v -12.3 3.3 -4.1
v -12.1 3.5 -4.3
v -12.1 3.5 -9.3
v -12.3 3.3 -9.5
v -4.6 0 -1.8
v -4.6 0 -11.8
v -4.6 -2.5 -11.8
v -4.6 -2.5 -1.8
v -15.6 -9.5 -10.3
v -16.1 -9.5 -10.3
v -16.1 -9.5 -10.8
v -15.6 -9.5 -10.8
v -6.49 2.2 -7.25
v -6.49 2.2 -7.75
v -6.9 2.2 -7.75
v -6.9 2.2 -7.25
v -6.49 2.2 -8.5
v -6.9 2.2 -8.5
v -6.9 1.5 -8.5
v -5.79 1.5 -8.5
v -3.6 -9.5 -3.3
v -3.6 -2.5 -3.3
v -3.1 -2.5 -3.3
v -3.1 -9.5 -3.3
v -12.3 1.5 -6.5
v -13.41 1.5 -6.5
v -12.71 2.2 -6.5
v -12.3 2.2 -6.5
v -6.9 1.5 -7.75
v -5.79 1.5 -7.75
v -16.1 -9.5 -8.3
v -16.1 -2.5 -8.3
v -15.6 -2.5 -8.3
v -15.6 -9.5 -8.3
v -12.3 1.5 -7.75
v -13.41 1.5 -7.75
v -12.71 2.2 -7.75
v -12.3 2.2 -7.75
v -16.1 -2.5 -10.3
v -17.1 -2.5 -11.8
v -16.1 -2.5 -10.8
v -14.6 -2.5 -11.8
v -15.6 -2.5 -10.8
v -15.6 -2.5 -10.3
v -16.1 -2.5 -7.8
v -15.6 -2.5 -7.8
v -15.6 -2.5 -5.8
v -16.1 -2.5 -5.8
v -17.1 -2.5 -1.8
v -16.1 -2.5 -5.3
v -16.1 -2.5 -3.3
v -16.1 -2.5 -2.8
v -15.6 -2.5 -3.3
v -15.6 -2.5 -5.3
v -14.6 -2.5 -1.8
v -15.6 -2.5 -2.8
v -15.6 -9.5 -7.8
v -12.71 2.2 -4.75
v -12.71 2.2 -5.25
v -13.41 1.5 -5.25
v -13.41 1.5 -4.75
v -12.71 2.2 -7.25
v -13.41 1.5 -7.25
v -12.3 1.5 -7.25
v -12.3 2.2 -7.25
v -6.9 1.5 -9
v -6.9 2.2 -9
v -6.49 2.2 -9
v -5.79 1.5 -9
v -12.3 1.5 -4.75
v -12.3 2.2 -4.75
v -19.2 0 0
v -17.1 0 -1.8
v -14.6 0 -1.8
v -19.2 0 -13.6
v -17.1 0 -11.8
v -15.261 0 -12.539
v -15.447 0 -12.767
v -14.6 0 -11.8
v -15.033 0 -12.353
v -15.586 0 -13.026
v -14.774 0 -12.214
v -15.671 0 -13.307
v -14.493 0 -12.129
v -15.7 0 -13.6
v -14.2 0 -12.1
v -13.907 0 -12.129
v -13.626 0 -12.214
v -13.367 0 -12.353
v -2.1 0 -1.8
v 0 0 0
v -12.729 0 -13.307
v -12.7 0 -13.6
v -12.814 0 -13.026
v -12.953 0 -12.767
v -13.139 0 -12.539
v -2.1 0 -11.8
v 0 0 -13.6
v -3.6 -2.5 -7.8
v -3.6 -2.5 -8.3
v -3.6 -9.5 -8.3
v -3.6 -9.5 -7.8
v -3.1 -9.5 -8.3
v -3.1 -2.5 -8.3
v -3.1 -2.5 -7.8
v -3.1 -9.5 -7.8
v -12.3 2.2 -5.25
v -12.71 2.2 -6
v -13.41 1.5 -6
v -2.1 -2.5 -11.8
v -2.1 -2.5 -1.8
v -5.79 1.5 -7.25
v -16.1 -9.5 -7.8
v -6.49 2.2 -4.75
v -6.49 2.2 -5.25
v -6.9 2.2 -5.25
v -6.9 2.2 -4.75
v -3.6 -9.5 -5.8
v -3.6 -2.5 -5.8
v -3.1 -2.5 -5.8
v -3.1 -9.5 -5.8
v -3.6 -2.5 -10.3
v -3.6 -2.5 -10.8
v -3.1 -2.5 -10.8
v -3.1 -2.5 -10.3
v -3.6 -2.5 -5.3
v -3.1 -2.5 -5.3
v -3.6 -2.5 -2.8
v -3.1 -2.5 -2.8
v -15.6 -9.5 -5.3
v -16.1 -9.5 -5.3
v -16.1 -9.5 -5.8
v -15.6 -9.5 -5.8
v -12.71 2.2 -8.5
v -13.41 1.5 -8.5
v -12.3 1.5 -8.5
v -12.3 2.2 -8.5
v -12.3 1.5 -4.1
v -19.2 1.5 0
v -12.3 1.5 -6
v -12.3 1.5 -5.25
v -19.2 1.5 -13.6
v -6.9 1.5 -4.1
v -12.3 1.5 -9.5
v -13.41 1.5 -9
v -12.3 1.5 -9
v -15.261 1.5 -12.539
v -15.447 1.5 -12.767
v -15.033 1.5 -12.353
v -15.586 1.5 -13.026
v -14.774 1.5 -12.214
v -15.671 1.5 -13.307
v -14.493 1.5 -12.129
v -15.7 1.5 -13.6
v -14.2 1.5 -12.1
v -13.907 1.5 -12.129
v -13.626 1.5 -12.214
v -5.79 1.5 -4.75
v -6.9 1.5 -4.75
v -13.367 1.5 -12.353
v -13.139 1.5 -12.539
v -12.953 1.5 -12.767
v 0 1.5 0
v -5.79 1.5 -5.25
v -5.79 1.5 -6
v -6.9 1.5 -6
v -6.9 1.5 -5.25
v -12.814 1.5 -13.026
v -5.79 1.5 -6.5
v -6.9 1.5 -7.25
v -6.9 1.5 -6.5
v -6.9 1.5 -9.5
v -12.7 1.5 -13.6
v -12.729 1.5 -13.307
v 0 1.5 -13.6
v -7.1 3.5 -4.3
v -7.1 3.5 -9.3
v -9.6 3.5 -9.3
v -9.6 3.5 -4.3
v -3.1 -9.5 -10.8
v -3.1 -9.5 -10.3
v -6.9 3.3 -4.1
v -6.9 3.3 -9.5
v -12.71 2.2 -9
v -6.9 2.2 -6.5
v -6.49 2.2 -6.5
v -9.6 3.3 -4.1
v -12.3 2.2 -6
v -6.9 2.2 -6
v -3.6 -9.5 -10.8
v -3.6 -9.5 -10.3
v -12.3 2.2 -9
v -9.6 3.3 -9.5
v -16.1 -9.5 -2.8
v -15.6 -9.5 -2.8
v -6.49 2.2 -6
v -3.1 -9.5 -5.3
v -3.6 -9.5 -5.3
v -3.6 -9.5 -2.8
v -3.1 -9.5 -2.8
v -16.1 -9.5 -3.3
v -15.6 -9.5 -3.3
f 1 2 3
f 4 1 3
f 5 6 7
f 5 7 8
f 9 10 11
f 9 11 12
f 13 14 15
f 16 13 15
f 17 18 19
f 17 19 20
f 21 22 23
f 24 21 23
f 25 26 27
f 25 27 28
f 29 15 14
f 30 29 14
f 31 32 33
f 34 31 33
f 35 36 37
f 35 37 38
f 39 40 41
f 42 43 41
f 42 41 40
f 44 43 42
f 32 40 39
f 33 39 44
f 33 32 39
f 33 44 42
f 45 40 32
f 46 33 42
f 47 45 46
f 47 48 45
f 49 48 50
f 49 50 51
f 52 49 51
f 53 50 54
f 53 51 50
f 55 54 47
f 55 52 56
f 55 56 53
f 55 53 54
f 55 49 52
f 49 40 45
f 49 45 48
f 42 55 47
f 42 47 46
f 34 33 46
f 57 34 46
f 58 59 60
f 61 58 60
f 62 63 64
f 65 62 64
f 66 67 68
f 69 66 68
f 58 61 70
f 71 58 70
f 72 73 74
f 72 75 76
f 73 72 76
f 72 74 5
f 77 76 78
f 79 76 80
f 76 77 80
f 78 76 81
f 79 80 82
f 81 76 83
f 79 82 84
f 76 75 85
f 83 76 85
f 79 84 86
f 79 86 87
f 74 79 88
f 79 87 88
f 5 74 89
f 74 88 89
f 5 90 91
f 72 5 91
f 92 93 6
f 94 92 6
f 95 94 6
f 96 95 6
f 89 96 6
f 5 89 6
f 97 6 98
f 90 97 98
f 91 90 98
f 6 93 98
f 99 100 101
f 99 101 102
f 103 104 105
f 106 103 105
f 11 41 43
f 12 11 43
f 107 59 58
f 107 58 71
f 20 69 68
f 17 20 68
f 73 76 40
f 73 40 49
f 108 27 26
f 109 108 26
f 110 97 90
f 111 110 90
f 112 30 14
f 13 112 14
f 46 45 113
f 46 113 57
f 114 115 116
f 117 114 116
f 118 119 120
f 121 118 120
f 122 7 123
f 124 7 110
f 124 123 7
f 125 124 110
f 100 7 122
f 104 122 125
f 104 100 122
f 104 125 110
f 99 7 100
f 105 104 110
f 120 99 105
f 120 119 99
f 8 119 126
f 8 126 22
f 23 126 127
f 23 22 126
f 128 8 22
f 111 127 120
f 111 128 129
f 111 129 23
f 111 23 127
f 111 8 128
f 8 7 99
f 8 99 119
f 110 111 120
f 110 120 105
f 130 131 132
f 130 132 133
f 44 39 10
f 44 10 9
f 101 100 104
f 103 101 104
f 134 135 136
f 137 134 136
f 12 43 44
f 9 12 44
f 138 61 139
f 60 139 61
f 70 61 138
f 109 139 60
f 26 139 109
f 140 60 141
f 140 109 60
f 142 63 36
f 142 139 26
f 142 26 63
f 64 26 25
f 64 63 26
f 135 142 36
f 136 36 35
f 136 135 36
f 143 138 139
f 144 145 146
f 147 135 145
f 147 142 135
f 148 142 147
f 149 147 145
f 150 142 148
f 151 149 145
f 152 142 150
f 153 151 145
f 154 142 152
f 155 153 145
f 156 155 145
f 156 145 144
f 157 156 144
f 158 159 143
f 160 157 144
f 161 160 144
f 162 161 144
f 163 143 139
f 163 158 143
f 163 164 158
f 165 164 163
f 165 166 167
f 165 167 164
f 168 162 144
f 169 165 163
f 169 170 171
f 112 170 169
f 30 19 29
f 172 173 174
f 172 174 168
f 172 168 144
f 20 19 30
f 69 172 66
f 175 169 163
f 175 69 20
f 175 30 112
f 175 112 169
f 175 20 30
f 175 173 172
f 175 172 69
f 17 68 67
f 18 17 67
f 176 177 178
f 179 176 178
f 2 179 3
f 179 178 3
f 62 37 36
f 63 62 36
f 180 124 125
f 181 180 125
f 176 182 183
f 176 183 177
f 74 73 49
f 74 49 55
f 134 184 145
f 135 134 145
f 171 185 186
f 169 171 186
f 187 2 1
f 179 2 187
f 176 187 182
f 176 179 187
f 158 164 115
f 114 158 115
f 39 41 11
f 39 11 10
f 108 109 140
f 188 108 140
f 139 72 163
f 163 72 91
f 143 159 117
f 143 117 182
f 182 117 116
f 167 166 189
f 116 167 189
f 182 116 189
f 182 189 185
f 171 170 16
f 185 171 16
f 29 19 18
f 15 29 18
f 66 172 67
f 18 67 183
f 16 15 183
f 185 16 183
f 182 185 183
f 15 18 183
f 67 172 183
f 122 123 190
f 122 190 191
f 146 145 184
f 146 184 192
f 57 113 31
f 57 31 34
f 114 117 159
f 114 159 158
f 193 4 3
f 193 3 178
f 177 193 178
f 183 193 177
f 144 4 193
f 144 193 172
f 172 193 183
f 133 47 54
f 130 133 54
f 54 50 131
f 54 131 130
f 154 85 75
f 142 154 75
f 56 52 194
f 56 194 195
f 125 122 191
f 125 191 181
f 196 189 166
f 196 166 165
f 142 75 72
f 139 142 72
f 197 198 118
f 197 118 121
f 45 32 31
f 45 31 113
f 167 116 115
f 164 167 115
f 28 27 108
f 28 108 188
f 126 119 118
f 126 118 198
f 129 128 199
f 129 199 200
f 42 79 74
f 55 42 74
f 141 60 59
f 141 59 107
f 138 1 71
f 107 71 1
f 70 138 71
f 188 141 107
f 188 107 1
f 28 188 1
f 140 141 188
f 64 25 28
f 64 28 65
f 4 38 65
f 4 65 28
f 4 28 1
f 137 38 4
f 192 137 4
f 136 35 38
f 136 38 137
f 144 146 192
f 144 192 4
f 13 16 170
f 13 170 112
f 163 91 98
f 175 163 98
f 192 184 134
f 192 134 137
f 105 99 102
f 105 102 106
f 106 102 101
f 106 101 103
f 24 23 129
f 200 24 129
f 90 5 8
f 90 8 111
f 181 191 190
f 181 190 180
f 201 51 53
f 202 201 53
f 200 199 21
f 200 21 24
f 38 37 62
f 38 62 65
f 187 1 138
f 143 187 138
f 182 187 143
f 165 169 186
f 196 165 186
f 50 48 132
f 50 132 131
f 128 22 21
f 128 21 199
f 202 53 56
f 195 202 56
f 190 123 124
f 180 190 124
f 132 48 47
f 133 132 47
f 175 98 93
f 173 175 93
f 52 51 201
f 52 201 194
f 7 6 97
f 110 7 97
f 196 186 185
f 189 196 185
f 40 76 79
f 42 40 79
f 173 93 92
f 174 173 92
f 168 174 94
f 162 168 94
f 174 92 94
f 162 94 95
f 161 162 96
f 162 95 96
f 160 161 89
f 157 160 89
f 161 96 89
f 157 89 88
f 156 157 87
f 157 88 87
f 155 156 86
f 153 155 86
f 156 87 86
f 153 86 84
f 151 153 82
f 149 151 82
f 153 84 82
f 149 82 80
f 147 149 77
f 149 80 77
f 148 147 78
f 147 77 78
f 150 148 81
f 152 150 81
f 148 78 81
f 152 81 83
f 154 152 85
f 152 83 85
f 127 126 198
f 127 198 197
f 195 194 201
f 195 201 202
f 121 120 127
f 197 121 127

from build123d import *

# Parameters (mm, degrees)
BOSS_EXTRUDE1_DEPTH        = 1.5
SKETCH2_W                  = 2.7
SKETCH2_H                  = 5.4
BOSS_EXTRUDE2_DEPTH        = 2
CHAMFER1_SIZE              = 0.2
SKETCH3_W                  = 1.410498469
SKETCH3_H                  = 0.5
BOSS_EXTRUDE3_DEPTH        = 0.7
CHAMFER2_SIZE              = 1
LPATTERN2_COUNT            = 4
LPATTERN2_PITCH            = 1.25
CHAMFER2_OF_LPATTERN2_SIZE = 1
MIRROR1_START              = -9.5
MIRROR1_DEPTH              = 5.4
MIRROR1_START_2            = -9
MIRROR1_2_DEPTH            = 0.5
MIRROR1_START_3            = -7.75
MIRROR1_3_DEPTH            = 0.5
MIRROR1_START_4            = -6.5
MIRROR1_4_DEPTH            = 0.5
MIRROR1_START_5            = -5.25
MIRROR1_5_DEPTH            = 0.5
MIRROR1_START_6            = -0.565685425
MIRROR1_6_OUTLINE_W        = 4.6
MIRROR1_6_OUTLINE_H        = 5.050966799
MIRROR1_6_DEPTH            = 1.565685425
MIRROR1_START_7            = -5
MIRROR1_7_OUTLINE_W        = 4.6
MIRROR1_7_OUTLINE_H        = 1.949033201
MIRROR1_7_DEPTH            = 4.434314575
SKETCH5_W                  = 2.5
SKETCH5_H                  = 10
BOSS_EXTRUDE4_DEPTH        = 2.5
SKETCH6_W                  = 0.5
SKETCH6_H                  = 0.5
BOSS_EXTRUDE5_DEPTH        = 7
LPATTERN3_COUNT            = 4
LPATTERN3_PITCH            = 2.5


with BuildPart() as part:
    # Sketch1 → Boss-Extrude1 (new body)
    with BuildSketch(Plane(origin=(0, 0, 0), x_dir=(1, 0, 0), z_dir=(0, 1, 0))):
        with BuildLine():
            Line((-19.2, 0), (0, 0))
            Line((0, 0), (0, 13.6))
            Line((0, 13.6), (-12.7, 13.6))
            ThreePointArc((-12.7, 13.6), (-14.2, 12.1), (-15.7, 13.6))
            Line((-15.7, 13.6), (-19.2, 13.6))
            Line((-19.2, 13.6), (-19.2, 0))
        make_face()
    extrude(amount=BOSS_EXTRUDE1_DEPTH)

    # Sketch2 → Boss-Extrude2 (add)
    with BuildSketch(Plane(origin=(0, 1.5, 0), x_dir=(1, 0, 0), z_dir=(0, 1, 0))):
        with Locations((-10.95, 6.8)):
            Rectangle(SKETCH2_W, SKETCH2_H)
    extrude(amount=BOSS_EXTRUDE2_DEPTH)

    # Chamfer1
    chamfer1_edges = [part.edges().sort_by_distance(p)[0] for p in [
        (-12.3, 3.5, -6.8),
        (-10.95, 3.5, -4.1),
        (-10.95, 3.5, -9.5),
    ]]
    chamfer(chamfer1_edges, length=CHAMFER1_SIZE)

    # Sketch3 → Boss-Extrude3 (add)
    with BuildSketch(Plane(origin=(0, 1.5, 0), x_dir=(1, 0, 0), z_dir=(0, 1, 0))):
        with Locations((-13.005249235, 8.75)):
            Rectangle(SKETCH3_W, SKETCH3_H)
    boss_extrude3 = extrude(amount=BOSS_EXTRUDE3_DEPTH)

    # Chamfer2
    # the kernel refuses this chamfer: 1 mm, written as the material it takes off along each edge
    with BuildSketch(Plane(origin=(-13.710498469, 2.2, -11.571682988), x_dir=(1, 0, 0), z_dir=(0, 0, 1))) as chamfer2_piece_1_section:
        Polygon((CHAMFER2_SIZE, 0), (0, -CHAMFER2_SIZE), (0, 0), align=None)
    chamfer2_piece_1 = extrude(amount=5.643365976, mode=Mode.PRIVATE)
    chamfer2_piece_1 = split(chamfer2_piece_1, bisect_by=Plane(origin=(-13.710498469, 1.5, -11.571682988), z_dir=(0, 1, 0)), keep=Keep.TOP, mode=Mode.PRIVATE)
    add(chamfer2_piece_1, mode=Mode.SUBTRACT)

    # LPattern2: Boss-Extrude3 ×4
    with Locations(*[(0, 0, i * LPATTERN2_PITCH) for i in range(1, LPATTERN2_COUNT)]):
        add(boss_extrude3)

    # Chamfer2 of LPattern2
    # the kernel refuses this chamfer: 1 mm, written as the material it takes off along each edge
    with BuildSketch(Plane(origin=(-13.710498469, 2.2, -10.321682988), x_dir=(1, 0, 0), z_dir=(0, 0, 1))) as chamfer2_of_lpattern2_piece_1_section:
        Polygon((CHAMFER2_OF_LPATTERN2_SIZE, 0), (0, -CHAMFER2_OF_LPATTERN2_SIZE), (0, 0), align=None)
    chamfer2_of_lpattern2_piece_1 = extrude(amount=5.643365976, mode=Mode.PRIVATE)
    chamfer2_of_lpattern2_piece_1 = split(chamfer2_of_lpattern2_piece_1, bisect_by=Plane(origin=(-13.710498469, 1.5, -10.321682988), z_dir=(0, 1, 0)), keep=Keep.TOP, mode=Mode.PRIVATE)
    add(chamfer2_of_lpattern2_piece_1, mode=Mode.SUBTRACT)
    with BuildSketch(Plane(origin=(-13.710498469, 2.2, -9.071682988), x_dir=(1, 0, 0), z_dir=(0, 0, 1))) as chamfer2_of_lpattern2_piece_2_section:
        Polygon((CHAMFER2_OF_LPATTERN2_SIZE, 0), (0, -CHAMFER2_OF_LPATTERN2_SIZE), (0, 0), align=None)
    chamfer2_of_lpattern2_piece_2 = extrude(amount=5.643365976, mode=Mode.PRIVATE)
    chamfer2_of_lpattern2_piece_2 = split(chamfer2_of_lpattern2_piece_2, bisect_by=Plane(origin=(-13.710498469, 1.5, -9.071682988), z_dir=(0, 1, 0)), keep=Keep.TOP, mode=Mode.PRIVATE)
    add(chamfer2_of_lpattern2_piece_2, mode=Mode.SUBTRACT)
    with BuildSketch(Plane(origin=(-13.710498469, 2.2, -7.821682988), x_dir=(1, 0, 0), z_dir=(0, 0, 1))) as chamfer2_of_lpattern2_piece_3_section:
        Polygon((CHAMFER2_OF_LPATTERN2_SIZE, 0), (0, -CHAMFER2_OF_LPATTERN2_SIZE), (0, 0), align=None)
    chamfer2_of_lpattern2_piece_3 = extrude(amount=5.643365976, mode=Mode.PRIVATE)
    chamfer2_of_lpattern2_piece_3 = split(chamfer2_of_lpattern2_piece_3, bisect_by=Plane(origin=(-13.710498469, 1.5, -7.821682988), z_dir=(0, 1, 0)), keep=Keep.TOP, mode=Mode.PRIVATE)
    add(chamfer2_of_lpattern2_piece_3, mode=Mode.SUBTRACT)

    # Mirror1: read off the stored shape, not the designer's step
    # Mirror1 outline → Mirror1 (add)
    with BuildSketch(Plane.XY.offset(MIRROR1_START)):
        Polygon((-6.9, 3.3), (-7.1, 3.5), (-9.6, 3.5), (-9.6, 1.5), (-6.9, 1.5), align=None)
    extrude(amount=MIRROR1_DEPTH)

    # Mirror1 2 outline → Mirror1 2 (add)
    with BuildSketch(Plane.XY.offset(MIRROR1_START_2)):
        Polygon((-6.489501531, 2.2), (-6.9, 2.2), (-6.9, 1.5), (-5.789501531, 1.5), align=None)
    extrude(amount=MIRROR1_2_DEPTH)

    # Mirror1 3 outline → Mirror1 3 (add)
    with BuildSketch(Plane.XY.offset(MIRROR1_START_3)):
        Polygon((-6.489501531, 2.2), (-6.9, 2.2), (-6.9, 1.5), (-5.789501531, 1.5), align=None)
    extrude(amount=MIRROR1_3_DEPTH)

    # Mirror1 4 outline → Mirror1 4 (add)
    with BuildSketch(Plane.XY.offset(MIRROR1_START_4)):
        Polygon((-6.489501531, 2.2), (-6.9, 2.2), (-6.9, 1.5), (-5.789501531, 1.5), align=None)
    extrude(amount=MIRROR1_4_DEPTH)

    # Mirror1 5 outline → Mirror1 5 (add)
    with BuildSketch(Plane.XY.offset(MIRROR1_START_5)):
        Polygon((-6.489501531, 2.2), (-6.9, 2.2), (-6.9, 1.5), (-5.789501531, 1.5), align=None)
    extrude(amount=MIRROR1_5_DEPTH)

    # Mirror1 6 outline → Mirror1 6 (cut)
    with BuildSketch(Plane(origin=(0, 0, 0), x_dir=(1, 0, 0), z_dir=(0, 0.707106781186545, 0.70710678118655)).offset(MIRROR1_START_6)):
        with Locations((-7.3, 6.5254834)):
            Rectangle(MIRROR1_6_OUTLINE_W, MIRROR1_6_OUTLINE_H)
    extrude(amount=MIRROR1_6_DEPTH, mode=Mode.SUBTRACT)

    # Mirror1 7 outline → Mirror1 7 (cut)
    with BuildSketch(Plane(origin=(0, 0, 0), x_dir=(1, 0, 0), z_dir=(0, 0.707106781186545, 0.70710678118655)).offset(MIRROR1_START_7)):
        with Locations((-7.3, 10.0254834)):
            Rectangle(MIRROR1_7_OUTLINE_W, MIRROR1_7_OUTLINE_H)
    extrude(amount=MIRROR1_7_DEPTH, mode=Mode.SUBTRACT)

    # Sketch5 → Boss-Extrude4 (add)
    with BuildSketch(Plane.XZ):
        with Locations((-15.85, -6.8)):
            Rectangle(SKETCH5_W, SKETCH5_H)
        with Locations((-3.35, -6.8)):
            Rectangle(SKETCH5_W, SKETCH5_H)
    extrude(amount=BOSS_EXTRUDE4_DEPTH)

    # Sketch6 → Boss-Extrude5 (add)
    with BuildSketch(Plane.XZ.offset(2.5)):
        with Locations((-15.85, -3.05)):
            Rectangle(SKETCH6_W, SKETCH6_H)
        with Locations((-3.35, -3.05)):
            Rectangle(SKETCH6_W, SKETCH6_H)
    boss_extrude5 = extrude(amount=BOSS_EXTRUDE5_DEPTH)

    # LPattern3: Boss-Extrude5 ×4
    with Locations(*[(0, 0, -i * LPATTERN3_PITCH) for i in range(1, LPATTERN3_COUNT)]):
        add(boss_extrude5)


solid = part.part
